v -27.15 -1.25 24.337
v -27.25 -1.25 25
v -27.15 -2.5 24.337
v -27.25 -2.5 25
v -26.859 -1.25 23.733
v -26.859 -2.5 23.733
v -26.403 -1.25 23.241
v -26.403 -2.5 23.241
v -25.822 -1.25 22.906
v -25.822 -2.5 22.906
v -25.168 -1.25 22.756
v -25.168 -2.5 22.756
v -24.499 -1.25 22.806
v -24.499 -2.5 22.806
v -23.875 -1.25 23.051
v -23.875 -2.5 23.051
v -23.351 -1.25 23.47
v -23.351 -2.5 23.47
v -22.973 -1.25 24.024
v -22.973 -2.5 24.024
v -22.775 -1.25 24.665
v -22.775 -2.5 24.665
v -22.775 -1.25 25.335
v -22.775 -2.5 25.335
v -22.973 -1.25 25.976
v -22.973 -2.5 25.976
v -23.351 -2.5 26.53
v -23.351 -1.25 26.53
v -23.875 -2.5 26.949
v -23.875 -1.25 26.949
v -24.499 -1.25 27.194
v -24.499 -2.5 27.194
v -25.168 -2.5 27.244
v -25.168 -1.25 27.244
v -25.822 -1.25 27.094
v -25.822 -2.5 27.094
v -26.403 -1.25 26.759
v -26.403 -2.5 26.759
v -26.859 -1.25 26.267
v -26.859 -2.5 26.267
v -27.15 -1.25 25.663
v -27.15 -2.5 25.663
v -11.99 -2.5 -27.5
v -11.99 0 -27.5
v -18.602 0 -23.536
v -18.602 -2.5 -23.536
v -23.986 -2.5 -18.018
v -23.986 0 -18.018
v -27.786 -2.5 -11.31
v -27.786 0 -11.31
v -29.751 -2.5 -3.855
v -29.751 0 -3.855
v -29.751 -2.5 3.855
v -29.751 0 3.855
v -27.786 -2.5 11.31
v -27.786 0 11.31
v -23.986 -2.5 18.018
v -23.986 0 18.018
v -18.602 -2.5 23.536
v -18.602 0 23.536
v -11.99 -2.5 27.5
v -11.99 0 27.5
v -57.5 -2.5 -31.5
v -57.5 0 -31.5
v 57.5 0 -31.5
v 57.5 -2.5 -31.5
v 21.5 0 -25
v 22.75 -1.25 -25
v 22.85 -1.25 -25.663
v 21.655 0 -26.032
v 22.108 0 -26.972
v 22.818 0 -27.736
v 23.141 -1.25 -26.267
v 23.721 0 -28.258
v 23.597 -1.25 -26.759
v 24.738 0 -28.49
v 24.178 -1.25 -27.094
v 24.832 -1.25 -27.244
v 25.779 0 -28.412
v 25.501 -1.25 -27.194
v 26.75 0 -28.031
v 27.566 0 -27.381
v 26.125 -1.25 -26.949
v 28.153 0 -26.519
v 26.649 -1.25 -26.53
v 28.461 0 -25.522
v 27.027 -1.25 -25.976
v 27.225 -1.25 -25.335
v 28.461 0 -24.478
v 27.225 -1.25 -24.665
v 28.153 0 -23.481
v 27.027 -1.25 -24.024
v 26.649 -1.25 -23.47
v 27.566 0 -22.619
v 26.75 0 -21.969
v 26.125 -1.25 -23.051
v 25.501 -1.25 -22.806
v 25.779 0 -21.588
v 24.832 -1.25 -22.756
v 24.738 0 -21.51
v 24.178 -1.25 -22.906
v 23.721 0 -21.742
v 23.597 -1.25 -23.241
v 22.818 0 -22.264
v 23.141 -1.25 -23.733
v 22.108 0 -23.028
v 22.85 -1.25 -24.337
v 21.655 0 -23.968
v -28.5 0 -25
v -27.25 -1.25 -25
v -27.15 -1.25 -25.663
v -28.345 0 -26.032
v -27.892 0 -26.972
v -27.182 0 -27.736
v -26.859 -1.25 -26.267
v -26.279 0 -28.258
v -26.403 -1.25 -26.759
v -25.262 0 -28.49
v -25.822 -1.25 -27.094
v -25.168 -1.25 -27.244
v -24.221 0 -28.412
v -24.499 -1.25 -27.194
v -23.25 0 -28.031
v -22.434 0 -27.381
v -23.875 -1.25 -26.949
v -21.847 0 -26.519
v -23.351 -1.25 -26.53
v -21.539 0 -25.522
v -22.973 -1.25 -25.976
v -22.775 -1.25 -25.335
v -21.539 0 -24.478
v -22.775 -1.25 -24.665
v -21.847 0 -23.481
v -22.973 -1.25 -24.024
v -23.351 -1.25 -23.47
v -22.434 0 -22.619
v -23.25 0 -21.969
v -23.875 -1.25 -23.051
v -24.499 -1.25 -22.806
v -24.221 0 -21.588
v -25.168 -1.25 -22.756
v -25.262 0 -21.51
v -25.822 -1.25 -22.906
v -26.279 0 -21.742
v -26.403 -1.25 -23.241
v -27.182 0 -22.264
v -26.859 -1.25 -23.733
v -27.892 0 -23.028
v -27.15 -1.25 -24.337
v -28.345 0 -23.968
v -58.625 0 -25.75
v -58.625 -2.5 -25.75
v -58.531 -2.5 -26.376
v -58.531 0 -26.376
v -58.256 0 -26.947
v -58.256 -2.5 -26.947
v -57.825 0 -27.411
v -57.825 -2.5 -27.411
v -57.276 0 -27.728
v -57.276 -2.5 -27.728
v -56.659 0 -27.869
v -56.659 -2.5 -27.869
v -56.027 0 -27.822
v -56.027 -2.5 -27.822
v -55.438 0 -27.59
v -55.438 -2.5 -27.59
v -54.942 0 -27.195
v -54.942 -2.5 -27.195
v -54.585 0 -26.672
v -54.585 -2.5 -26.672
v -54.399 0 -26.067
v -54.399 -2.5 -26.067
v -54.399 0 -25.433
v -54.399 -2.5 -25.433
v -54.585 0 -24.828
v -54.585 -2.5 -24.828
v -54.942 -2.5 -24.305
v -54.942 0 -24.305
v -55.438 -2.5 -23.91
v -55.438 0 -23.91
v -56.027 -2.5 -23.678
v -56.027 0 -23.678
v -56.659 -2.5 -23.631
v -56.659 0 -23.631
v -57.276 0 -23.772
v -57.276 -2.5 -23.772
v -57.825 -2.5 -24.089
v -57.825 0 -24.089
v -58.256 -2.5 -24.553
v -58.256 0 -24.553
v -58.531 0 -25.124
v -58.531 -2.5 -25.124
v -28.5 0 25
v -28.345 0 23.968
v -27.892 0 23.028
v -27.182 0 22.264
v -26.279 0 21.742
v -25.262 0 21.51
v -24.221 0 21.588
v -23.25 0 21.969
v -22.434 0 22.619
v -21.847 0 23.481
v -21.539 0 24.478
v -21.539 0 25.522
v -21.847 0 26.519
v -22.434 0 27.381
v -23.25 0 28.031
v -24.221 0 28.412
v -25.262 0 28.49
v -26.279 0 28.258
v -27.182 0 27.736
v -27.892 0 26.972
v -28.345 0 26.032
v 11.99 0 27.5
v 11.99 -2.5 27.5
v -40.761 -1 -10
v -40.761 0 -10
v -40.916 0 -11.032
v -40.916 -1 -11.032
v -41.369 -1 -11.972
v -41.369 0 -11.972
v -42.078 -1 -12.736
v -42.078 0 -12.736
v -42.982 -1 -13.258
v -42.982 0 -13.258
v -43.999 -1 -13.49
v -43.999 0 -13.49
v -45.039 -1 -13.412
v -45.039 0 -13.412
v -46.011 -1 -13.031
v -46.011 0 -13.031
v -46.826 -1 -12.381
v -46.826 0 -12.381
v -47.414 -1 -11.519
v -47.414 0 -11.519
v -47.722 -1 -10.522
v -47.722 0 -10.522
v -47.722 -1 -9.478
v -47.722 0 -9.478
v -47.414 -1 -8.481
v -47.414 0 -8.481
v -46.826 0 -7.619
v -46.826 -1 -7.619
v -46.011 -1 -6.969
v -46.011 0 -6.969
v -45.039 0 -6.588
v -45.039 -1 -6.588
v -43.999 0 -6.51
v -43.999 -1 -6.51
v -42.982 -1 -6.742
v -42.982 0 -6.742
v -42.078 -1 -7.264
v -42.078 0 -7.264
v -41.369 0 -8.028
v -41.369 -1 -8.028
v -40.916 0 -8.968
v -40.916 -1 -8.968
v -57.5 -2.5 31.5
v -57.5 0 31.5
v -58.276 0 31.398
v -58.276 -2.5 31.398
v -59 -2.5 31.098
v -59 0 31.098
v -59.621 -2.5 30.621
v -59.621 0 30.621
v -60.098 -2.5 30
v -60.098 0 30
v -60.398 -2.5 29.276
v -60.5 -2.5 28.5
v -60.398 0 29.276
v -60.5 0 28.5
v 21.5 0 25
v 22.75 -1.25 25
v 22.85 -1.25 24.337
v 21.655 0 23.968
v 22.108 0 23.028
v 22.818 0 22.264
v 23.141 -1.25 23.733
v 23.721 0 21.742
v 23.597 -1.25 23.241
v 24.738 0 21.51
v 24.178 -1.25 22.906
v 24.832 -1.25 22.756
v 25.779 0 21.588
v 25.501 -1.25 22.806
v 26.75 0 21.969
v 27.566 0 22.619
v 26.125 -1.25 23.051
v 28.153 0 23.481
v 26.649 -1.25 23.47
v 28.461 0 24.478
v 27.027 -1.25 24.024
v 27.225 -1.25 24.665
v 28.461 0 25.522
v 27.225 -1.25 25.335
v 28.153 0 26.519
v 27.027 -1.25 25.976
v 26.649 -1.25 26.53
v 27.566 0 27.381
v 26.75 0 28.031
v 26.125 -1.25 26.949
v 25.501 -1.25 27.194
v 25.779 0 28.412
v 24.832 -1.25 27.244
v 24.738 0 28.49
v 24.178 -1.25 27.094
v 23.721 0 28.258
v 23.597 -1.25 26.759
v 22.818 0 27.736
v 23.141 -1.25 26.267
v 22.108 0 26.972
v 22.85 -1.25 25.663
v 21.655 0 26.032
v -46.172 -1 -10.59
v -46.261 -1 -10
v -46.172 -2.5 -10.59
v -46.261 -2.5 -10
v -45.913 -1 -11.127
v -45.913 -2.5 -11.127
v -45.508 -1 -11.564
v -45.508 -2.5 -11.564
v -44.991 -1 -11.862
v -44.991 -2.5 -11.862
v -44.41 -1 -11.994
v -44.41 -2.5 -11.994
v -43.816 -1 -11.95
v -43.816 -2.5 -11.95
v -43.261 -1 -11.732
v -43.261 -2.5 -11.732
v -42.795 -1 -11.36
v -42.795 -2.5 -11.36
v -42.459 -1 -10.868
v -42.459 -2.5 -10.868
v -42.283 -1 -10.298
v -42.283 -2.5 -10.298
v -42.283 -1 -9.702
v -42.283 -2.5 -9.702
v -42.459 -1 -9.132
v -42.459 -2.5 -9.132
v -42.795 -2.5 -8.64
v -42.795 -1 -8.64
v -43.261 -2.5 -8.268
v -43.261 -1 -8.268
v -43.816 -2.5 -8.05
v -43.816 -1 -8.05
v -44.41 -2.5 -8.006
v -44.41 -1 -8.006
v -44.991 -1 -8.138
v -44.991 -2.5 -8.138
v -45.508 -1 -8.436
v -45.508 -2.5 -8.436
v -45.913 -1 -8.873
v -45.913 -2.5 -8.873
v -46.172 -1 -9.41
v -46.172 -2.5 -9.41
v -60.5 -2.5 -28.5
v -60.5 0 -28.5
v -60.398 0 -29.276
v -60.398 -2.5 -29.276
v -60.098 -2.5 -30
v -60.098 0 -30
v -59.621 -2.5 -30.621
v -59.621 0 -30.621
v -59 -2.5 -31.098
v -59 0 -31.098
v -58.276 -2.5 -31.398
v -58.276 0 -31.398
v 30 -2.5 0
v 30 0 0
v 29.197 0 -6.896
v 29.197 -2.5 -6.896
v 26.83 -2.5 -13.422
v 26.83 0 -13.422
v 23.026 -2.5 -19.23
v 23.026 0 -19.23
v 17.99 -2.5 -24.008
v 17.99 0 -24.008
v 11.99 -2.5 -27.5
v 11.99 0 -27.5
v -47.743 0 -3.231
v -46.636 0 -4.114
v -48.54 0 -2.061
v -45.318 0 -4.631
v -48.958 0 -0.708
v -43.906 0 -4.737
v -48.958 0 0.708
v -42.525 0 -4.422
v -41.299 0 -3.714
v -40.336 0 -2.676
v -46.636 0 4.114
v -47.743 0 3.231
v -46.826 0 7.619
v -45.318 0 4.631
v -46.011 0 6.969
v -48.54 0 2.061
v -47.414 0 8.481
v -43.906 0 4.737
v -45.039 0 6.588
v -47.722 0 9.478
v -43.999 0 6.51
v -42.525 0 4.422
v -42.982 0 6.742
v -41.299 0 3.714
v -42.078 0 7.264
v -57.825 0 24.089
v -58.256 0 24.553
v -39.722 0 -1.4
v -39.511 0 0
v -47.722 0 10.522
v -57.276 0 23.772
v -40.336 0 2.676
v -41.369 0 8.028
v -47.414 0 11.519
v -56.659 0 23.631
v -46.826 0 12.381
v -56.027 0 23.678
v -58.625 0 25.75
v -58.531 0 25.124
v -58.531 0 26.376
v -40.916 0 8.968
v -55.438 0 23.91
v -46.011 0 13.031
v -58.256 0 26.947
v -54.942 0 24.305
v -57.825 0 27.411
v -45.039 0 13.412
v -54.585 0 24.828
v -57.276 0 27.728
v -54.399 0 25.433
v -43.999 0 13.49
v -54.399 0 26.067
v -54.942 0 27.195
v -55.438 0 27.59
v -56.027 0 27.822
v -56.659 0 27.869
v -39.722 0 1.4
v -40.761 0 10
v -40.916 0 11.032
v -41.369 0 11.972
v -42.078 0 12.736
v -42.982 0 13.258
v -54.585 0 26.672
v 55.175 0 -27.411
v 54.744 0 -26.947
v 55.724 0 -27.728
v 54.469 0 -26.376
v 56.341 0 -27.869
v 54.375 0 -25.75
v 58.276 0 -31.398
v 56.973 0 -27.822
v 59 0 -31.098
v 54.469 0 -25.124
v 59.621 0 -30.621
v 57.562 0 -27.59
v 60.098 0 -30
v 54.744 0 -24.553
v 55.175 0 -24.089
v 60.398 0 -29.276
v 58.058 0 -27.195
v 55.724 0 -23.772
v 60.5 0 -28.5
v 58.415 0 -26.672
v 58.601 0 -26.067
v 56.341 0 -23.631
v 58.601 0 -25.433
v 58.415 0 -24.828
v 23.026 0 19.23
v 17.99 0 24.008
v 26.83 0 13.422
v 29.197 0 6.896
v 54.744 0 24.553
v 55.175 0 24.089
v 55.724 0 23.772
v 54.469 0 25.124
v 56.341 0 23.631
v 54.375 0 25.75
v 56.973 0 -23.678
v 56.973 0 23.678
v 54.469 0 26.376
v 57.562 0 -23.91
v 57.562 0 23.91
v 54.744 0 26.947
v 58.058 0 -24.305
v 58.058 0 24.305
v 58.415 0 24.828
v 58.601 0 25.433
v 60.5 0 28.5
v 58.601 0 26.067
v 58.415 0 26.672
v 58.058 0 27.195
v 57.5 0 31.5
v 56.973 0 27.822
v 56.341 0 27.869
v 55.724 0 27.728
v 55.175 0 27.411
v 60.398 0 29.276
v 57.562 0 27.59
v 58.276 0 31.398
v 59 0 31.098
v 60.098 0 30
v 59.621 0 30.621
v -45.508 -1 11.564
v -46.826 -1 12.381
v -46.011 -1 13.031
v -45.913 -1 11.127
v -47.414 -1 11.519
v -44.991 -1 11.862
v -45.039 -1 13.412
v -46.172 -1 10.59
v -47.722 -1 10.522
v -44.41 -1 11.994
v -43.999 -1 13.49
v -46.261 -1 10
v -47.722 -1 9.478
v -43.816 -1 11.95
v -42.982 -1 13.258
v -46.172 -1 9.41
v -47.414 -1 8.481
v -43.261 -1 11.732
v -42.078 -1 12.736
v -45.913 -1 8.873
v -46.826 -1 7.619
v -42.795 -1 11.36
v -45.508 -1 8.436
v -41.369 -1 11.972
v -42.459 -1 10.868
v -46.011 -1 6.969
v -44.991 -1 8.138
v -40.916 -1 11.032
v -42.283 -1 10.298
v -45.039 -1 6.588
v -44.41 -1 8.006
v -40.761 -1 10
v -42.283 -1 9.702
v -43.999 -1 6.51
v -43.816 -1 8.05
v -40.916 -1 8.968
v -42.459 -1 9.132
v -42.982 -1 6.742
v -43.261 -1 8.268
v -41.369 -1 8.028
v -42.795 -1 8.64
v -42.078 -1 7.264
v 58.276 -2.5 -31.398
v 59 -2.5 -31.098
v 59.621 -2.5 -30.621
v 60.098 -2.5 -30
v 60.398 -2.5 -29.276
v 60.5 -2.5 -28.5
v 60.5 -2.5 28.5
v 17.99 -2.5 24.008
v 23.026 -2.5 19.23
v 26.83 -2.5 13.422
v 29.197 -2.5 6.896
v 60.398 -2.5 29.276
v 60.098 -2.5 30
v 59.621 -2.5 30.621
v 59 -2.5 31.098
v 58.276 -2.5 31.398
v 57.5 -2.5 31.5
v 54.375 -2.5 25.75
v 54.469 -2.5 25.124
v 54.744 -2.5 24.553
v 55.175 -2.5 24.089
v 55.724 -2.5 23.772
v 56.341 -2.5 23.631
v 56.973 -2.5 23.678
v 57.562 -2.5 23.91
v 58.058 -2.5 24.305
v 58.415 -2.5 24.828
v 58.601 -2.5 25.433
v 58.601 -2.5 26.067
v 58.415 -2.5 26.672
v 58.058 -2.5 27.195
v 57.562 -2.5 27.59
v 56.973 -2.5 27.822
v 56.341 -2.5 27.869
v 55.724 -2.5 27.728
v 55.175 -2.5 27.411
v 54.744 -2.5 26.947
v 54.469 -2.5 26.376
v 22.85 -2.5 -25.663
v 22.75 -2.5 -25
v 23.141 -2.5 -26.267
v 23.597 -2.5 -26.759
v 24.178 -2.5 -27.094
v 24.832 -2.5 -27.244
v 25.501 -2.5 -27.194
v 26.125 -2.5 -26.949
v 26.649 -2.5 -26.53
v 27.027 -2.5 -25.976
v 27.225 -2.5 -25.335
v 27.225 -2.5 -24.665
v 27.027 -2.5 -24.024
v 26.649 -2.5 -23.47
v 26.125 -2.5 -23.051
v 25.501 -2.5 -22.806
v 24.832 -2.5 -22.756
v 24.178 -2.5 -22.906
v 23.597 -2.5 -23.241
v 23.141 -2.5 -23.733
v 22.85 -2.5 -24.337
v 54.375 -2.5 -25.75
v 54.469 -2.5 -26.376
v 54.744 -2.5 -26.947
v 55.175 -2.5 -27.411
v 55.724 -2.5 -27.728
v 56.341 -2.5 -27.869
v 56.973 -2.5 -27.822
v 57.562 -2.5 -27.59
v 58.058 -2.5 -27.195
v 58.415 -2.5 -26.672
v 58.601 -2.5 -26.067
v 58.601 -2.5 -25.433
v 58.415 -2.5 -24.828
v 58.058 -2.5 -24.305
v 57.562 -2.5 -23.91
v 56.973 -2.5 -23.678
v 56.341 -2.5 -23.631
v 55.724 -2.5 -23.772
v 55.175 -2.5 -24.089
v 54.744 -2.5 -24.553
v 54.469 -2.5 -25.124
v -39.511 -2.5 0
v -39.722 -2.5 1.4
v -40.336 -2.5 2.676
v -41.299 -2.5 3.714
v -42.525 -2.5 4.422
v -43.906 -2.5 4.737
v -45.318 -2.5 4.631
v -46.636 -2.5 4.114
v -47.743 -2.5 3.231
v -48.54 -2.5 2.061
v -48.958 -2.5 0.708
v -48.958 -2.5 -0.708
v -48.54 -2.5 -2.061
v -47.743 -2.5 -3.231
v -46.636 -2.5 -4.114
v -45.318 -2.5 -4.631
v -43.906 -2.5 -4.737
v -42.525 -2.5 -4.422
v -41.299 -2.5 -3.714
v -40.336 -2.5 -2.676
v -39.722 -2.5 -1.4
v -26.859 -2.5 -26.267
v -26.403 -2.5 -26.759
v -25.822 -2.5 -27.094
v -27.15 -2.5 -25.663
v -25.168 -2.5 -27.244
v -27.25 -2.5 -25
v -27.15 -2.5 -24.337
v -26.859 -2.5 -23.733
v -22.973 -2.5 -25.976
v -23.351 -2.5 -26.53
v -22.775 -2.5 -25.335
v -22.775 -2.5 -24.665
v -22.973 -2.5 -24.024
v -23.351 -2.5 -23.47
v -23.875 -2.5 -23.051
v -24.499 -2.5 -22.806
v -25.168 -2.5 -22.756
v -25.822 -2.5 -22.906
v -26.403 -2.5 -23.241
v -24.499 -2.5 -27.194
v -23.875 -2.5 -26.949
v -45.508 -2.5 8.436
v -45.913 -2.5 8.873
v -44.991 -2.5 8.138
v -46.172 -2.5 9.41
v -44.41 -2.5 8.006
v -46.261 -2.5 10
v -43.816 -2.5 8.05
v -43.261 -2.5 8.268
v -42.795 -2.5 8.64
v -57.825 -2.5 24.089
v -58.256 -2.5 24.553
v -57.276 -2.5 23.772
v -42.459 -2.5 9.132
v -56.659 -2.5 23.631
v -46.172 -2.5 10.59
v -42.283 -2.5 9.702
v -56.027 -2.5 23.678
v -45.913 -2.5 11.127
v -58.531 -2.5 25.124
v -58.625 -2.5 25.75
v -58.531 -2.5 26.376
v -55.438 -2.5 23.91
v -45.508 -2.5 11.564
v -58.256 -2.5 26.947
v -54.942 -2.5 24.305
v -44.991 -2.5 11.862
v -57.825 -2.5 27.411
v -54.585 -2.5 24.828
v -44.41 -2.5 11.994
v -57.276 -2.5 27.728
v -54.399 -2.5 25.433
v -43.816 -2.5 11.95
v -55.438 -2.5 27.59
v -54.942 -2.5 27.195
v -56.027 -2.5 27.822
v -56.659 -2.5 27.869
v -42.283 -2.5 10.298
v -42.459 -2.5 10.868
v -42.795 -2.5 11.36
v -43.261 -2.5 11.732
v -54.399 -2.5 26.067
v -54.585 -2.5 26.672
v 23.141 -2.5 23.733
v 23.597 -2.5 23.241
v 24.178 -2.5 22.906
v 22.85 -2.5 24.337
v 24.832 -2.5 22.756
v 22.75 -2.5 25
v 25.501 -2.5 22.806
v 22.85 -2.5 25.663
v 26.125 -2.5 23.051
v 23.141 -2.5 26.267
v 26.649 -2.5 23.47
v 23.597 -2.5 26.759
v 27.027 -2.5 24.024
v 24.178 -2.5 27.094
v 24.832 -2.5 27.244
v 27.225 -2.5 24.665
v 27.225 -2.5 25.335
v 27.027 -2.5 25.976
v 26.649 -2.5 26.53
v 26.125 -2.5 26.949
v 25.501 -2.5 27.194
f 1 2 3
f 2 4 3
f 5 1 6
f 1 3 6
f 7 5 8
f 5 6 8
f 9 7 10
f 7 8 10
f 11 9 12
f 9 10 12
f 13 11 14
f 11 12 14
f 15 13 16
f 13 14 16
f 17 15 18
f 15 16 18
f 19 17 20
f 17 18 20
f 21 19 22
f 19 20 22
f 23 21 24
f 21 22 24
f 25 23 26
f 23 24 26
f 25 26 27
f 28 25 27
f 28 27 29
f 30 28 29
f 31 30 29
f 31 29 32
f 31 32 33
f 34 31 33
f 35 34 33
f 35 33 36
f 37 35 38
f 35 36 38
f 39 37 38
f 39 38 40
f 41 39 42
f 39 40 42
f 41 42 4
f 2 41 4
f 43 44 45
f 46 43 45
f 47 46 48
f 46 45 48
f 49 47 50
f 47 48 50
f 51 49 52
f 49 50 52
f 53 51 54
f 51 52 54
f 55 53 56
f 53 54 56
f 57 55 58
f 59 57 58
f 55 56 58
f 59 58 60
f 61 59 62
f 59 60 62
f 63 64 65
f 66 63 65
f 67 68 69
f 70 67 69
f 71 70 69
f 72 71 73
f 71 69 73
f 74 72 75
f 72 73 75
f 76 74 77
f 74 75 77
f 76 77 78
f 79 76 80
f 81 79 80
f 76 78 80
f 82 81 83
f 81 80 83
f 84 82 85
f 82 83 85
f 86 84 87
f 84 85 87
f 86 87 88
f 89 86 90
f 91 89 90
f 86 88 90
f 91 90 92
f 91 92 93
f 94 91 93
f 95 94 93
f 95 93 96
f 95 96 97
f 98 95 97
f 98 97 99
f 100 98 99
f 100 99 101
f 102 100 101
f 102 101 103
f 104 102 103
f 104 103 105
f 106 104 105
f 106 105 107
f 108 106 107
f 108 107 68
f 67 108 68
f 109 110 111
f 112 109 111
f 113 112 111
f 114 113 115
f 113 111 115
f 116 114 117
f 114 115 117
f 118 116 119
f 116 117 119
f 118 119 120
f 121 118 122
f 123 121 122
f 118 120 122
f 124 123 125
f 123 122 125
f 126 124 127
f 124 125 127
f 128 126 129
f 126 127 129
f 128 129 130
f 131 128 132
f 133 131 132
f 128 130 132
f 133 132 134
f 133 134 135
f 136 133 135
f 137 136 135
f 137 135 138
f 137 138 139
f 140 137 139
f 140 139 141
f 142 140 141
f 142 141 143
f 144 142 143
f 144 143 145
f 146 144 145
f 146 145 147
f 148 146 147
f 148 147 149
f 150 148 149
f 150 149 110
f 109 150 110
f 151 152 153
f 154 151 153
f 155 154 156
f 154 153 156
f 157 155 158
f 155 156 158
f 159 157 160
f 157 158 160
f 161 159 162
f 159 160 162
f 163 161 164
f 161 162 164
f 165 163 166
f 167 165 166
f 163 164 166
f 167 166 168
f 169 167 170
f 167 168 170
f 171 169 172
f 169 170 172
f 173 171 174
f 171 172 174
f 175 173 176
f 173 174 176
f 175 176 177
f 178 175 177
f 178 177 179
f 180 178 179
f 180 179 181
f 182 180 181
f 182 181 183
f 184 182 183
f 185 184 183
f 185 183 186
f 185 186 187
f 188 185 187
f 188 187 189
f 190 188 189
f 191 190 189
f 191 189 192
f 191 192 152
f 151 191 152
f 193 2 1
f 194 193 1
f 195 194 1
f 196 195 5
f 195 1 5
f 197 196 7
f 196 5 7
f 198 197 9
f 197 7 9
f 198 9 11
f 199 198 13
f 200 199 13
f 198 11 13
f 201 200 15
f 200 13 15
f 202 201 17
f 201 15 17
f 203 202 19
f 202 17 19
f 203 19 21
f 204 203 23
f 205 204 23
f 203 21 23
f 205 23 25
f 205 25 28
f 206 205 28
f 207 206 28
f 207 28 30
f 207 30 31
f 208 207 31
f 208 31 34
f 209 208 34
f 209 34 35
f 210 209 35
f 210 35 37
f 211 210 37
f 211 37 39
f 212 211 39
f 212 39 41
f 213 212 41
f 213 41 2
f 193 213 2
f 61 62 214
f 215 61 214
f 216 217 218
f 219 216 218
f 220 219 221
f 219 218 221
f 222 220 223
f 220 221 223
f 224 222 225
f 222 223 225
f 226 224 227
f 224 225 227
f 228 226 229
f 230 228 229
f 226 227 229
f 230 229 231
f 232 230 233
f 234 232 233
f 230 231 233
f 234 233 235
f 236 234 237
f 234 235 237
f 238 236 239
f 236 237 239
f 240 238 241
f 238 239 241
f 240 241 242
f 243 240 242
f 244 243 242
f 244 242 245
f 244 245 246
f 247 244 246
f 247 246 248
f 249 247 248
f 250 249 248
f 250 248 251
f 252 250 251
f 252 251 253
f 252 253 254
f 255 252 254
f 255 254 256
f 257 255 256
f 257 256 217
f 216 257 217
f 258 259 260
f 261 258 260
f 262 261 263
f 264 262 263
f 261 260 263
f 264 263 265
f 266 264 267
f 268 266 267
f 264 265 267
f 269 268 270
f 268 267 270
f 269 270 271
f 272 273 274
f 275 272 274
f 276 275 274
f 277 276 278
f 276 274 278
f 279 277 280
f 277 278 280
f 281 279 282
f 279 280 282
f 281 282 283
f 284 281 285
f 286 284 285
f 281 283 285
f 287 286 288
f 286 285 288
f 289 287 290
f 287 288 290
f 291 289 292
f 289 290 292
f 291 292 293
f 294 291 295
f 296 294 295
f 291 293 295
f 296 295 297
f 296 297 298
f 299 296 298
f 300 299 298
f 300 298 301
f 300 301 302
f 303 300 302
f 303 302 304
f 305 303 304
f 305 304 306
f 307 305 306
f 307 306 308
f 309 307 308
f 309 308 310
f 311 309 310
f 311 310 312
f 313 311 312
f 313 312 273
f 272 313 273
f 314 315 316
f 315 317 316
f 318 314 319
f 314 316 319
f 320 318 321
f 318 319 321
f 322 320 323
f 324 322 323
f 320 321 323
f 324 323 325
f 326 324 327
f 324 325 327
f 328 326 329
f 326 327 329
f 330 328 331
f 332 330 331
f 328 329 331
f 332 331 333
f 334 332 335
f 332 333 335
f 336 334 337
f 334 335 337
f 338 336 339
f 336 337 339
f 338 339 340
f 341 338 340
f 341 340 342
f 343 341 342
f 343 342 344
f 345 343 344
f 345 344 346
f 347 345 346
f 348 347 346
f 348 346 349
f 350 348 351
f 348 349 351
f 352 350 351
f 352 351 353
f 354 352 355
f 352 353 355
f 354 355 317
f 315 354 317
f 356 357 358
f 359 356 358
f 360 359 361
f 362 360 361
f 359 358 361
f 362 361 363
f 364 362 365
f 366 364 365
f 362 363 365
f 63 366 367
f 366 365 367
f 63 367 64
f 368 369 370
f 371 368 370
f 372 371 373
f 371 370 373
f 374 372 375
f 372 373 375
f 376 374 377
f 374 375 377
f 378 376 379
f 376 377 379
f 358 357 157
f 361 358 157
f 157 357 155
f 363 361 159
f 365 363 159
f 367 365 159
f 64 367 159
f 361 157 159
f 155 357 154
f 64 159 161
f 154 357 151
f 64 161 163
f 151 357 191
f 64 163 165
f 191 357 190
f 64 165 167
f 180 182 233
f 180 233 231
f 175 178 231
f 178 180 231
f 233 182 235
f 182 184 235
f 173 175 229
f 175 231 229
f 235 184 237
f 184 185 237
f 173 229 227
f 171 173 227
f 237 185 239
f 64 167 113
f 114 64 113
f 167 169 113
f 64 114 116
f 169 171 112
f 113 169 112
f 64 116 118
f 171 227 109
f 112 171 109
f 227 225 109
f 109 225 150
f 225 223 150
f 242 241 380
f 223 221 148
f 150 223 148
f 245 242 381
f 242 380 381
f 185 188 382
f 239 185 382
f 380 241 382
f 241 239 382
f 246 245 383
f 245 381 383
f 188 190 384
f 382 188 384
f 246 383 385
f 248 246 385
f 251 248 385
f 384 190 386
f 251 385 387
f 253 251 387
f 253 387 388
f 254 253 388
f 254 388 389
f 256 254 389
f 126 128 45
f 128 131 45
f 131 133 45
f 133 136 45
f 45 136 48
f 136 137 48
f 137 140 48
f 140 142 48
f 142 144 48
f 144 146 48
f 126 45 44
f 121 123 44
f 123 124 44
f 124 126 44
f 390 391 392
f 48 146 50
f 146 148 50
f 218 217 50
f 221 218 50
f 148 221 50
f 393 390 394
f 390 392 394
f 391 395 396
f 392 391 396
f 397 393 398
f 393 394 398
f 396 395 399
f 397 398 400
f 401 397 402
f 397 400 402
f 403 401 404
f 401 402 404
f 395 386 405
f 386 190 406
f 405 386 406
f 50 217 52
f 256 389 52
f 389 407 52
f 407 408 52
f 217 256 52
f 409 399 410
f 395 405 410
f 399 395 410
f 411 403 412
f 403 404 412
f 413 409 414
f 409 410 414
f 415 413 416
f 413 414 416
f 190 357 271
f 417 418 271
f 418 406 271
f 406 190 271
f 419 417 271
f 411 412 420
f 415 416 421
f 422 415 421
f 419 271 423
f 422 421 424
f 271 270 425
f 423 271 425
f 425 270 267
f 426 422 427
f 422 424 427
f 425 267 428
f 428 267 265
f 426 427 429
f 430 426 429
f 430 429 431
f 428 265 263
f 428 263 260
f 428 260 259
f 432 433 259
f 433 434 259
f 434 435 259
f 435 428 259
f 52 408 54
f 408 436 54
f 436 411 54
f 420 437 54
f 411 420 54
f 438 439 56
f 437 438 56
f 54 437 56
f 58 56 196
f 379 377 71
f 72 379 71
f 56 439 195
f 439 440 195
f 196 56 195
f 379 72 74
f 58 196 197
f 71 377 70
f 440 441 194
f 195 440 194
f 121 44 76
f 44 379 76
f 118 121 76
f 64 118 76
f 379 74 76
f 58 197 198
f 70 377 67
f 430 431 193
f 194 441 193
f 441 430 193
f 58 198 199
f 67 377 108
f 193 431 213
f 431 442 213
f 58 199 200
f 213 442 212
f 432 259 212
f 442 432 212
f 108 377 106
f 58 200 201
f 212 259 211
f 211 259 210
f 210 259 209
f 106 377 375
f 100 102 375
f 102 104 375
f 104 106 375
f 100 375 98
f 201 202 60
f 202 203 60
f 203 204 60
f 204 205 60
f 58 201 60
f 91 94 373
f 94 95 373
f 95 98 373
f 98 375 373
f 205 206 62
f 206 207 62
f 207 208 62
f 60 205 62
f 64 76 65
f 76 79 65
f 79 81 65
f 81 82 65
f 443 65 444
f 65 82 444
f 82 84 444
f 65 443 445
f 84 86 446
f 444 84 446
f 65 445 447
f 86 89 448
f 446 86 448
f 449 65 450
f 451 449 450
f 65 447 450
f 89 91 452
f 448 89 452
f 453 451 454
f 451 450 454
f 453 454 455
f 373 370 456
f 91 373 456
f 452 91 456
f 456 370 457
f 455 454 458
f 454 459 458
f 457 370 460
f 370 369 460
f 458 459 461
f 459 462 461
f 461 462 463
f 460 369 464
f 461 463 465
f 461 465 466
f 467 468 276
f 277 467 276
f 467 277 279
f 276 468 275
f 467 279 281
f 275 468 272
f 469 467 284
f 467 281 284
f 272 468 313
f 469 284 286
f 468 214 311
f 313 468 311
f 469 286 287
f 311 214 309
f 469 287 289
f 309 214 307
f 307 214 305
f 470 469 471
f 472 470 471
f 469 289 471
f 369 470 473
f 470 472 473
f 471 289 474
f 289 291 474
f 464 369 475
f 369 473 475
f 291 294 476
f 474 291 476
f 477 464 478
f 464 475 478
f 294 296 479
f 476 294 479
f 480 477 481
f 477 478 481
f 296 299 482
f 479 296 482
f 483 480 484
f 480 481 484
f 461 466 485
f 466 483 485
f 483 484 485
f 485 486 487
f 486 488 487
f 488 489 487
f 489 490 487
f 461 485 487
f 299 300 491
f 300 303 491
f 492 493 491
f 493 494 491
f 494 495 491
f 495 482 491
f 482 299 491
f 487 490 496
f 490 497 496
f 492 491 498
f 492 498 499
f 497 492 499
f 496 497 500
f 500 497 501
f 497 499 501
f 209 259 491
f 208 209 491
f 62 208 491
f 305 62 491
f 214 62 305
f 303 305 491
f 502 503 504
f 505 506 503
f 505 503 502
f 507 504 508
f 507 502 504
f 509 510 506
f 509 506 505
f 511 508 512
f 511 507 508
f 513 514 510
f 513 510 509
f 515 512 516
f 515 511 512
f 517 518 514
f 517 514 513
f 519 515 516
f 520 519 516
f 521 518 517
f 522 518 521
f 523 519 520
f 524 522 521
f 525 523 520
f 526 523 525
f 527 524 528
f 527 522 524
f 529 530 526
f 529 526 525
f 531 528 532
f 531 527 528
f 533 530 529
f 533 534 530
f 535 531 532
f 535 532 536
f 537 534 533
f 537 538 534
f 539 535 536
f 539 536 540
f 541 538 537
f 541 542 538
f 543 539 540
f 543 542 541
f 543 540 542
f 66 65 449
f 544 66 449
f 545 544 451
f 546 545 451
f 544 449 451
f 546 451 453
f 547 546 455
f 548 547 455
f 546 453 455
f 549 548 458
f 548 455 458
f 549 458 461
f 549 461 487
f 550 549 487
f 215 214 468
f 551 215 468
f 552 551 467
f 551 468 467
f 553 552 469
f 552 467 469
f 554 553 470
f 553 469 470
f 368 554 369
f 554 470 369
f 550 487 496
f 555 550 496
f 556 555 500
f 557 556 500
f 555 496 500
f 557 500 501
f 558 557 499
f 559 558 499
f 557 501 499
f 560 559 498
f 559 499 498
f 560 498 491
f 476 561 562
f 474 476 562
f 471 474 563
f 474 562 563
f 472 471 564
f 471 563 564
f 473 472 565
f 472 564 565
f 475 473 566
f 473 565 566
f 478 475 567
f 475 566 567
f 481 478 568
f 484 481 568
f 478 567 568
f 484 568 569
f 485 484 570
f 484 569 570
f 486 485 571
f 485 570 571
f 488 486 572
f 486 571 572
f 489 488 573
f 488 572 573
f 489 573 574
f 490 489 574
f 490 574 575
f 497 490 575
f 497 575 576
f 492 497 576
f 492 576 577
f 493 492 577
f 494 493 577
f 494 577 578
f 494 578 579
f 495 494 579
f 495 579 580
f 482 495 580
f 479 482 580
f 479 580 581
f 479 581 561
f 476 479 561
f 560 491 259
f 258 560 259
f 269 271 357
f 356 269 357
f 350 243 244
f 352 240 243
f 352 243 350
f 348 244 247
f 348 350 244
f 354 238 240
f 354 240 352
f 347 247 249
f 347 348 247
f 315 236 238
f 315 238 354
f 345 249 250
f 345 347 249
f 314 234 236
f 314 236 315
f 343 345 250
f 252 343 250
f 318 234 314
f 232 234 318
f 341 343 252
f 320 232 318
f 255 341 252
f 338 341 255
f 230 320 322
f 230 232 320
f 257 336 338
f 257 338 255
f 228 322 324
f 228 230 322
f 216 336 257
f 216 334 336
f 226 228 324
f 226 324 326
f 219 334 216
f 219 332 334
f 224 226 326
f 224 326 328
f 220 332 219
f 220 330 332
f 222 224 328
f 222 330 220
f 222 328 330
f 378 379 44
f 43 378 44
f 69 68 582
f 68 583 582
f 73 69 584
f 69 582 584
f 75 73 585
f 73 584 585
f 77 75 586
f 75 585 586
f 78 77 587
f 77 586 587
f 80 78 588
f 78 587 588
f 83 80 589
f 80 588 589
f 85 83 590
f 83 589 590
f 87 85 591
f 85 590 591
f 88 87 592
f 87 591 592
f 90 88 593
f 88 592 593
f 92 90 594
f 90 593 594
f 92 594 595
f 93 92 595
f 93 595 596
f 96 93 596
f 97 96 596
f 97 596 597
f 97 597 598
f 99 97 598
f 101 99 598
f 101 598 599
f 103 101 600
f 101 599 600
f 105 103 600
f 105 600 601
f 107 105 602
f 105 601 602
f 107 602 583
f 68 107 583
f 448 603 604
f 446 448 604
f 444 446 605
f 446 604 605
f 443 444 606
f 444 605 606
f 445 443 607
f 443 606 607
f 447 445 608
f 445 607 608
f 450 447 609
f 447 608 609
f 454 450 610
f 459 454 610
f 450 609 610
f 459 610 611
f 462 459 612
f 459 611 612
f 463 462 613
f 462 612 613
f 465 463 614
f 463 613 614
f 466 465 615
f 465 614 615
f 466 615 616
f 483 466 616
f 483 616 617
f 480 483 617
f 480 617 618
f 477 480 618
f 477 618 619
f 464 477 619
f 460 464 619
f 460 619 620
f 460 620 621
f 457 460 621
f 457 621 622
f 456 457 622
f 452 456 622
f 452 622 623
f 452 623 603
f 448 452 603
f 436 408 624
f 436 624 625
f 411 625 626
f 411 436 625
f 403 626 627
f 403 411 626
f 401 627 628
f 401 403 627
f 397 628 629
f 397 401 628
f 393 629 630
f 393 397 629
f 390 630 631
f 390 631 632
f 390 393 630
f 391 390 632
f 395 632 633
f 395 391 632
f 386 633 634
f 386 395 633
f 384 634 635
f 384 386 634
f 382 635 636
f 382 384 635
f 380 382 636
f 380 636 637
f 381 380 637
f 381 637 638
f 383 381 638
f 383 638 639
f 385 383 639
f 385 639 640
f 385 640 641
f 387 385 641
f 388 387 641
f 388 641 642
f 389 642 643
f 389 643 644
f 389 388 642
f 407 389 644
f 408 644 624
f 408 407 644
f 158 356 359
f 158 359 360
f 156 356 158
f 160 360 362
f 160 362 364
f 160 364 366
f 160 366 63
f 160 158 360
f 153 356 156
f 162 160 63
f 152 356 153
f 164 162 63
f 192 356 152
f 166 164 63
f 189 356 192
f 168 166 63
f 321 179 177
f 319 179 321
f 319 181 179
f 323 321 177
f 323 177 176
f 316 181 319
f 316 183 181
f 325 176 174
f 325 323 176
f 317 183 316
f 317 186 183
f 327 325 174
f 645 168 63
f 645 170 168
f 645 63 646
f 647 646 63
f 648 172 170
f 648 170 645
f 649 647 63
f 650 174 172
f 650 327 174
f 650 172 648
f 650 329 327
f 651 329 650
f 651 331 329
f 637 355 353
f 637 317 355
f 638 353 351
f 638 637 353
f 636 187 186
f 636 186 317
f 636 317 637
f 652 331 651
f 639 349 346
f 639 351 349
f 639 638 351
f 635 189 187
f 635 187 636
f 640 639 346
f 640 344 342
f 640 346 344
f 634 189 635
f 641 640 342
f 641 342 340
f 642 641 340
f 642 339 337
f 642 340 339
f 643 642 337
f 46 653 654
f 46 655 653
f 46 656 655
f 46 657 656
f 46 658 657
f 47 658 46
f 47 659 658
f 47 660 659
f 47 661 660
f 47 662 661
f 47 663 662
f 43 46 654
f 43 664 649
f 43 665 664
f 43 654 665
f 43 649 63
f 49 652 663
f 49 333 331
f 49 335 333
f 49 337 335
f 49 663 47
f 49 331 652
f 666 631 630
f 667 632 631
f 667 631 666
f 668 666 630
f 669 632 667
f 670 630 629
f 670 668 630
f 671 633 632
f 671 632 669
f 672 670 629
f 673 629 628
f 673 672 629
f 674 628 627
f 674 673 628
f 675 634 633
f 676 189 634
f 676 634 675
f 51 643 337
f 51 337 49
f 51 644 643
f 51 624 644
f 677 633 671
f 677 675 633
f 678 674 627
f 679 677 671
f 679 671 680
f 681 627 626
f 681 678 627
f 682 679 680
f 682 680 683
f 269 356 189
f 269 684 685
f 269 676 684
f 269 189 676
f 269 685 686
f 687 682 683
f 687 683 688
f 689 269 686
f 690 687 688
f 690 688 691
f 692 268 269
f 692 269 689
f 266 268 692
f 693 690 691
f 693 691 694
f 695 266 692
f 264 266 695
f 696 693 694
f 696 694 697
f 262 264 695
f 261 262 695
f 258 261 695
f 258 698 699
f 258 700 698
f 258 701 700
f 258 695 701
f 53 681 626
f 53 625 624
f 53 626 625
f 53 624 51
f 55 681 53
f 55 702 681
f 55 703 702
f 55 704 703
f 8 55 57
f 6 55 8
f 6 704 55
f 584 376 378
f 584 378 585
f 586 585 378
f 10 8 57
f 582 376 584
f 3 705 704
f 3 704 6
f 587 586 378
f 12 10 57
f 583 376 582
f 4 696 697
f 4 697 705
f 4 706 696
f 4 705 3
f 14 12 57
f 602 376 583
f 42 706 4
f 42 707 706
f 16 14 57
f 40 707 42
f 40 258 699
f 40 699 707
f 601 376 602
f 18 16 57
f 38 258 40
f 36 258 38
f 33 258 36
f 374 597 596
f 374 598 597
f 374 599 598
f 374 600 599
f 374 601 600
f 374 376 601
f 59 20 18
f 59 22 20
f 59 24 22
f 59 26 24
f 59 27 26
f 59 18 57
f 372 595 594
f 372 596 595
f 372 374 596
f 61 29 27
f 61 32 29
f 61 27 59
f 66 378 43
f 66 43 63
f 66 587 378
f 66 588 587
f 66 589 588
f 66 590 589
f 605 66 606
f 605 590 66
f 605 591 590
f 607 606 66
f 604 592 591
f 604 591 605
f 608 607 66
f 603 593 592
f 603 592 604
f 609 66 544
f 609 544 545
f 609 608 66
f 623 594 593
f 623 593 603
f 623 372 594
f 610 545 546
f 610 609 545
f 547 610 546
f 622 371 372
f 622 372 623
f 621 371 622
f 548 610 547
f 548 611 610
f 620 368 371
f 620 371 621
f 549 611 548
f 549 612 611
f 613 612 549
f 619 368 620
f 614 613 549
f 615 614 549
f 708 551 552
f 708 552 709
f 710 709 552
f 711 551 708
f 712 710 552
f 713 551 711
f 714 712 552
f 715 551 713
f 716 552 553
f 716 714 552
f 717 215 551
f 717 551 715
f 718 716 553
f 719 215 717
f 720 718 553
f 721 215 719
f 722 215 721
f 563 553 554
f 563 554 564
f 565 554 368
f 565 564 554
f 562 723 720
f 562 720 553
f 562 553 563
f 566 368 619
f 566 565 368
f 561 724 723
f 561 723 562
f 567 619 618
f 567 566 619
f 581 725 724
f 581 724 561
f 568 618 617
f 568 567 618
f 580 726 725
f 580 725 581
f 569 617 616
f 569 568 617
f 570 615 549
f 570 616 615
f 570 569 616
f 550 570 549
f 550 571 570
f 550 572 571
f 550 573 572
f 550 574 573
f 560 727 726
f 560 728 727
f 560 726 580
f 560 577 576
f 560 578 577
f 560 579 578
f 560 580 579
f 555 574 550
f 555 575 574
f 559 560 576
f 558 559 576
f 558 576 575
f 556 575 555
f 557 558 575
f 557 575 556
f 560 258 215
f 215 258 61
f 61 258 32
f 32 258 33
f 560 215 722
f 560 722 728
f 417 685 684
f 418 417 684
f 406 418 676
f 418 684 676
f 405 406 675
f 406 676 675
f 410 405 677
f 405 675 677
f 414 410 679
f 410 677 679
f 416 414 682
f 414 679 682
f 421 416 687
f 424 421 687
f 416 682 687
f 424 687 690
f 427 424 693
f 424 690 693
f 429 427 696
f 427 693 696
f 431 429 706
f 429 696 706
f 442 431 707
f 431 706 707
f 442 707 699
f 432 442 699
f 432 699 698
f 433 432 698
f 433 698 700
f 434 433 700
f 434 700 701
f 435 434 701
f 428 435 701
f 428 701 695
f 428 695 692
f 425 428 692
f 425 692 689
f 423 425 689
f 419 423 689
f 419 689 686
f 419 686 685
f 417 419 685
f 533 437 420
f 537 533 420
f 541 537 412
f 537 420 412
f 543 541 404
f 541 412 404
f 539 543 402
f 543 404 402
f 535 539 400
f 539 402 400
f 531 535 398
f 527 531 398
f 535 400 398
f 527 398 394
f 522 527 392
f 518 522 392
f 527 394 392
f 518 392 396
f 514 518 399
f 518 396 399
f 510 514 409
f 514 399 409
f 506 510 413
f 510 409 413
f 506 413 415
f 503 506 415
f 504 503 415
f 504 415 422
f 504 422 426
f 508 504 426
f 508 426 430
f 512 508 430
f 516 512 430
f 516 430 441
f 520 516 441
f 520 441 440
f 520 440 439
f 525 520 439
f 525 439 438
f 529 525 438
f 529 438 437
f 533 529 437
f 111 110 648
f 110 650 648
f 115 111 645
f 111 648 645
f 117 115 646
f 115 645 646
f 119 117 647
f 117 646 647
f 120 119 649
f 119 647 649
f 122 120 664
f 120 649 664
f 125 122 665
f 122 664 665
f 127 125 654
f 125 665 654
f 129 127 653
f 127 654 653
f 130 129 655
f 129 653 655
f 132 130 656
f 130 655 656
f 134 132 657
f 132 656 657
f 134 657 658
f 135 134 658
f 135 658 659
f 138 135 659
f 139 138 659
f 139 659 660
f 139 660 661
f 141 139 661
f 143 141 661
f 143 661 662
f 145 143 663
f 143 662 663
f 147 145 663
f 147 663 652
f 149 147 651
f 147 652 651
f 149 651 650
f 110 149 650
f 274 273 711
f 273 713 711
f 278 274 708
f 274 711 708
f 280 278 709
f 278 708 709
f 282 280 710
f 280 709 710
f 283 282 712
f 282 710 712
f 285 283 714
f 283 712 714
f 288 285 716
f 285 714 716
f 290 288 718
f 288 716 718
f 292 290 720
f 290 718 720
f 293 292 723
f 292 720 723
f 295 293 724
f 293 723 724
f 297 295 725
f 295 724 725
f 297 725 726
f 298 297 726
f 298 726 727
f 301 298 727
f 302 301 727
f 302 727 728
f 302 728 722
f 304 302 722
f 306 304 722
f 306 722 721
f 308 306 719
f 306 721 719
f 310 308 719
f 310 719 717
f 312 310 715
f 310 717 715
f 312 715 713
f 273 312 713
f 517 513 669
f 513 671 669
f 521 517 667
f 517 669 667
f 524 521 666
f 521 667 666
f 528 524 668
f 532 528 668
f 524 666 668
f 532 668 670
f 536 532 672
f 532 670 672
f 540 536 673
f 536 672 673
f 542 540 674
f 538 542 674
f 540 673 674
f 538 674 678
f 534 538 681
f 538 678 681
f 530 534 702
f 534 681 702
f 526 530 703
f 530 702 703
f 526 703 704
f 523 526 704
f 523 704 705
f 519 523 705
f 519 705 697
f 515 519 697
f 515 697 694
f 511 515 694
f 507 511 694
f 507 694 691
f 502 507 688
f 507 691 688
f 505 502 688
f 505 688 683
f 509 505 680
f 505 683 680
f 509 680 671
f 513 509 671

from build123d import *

# Parameters (mm, degrees)
F0_R           = 4.75
F1_DEPTH       = 2.5
F2_D           = 4.25
F3_D           = 4.5
F3_CSINK_D     = 7
F3_CSINK_ANGLE = 90
F4_D           = 4
F4_CBORE_D     = 7
F4_CBORE_DEPTH = 1


with BuildPart() as f1:
    # F0 (on Front) → F1 (new body)
    with BuildSketch(Plane.XZ):
        with BuildLine():
            ThreePointArc((60.5, 28.5), (59.62132, 30.62132), (57.5, 31.5))
            Line((57.5, 31.5), (-57.5, 31.5))
            ThreePointArc((-57.5, 31.5), (-59.62132, 30.62132), (-60.5, 28.5))
            Line((-60.5, 28.5), (-60.5, -28.5))
            ThreePointArc((-60.5, -28.5), (-59.62132, -30.62132), (-57.5, -31.5))
            Line((-57.5, -31.5), (57.5, -31.5))
            ThreePointArc((57.5, -31.5), (59.62132, -30.62132), (60.5, -28.5))
            Line((60.5, -28.5), (60.5, 28.5))
        make_face()
        with Locations((-44.260606, 0)):
            Circle(F0_R, mode=Mode.SUBTRACT)
        with BuildLine():
            ThreePointArc((11.989579, 27.5), (25.096687, 16.436433), (30, 0))
            ThreePointArc((30, 0), (25.096687, -16.436433), (11.989579, -27.5))
            ThreePointArc((11.989579, -27.5), (0, -30), (-11.989579, -27.5))
            ThreePointArc((-11.989579, -27.5), (-30, 0), (-11.989579, 27.5))
            ThreePointArc((-11.989579, 27.5), (0, 30), (11.989579, 27.5))
        make_face(mode=Mode.SUBTRACT)
        with BuildLine():
            Line((-11.989579, 27.5), (11.989579, 27.5))
            ThreePointArc((11.989579, 27.5), (0, 30), (-11.989579, 27.5))
        make_face()
        with BuildLine():
            ThreePointArc((-11.989579, -27.5), (0, -30), (11.989579, -27.5))
            Line((11.989579, -27.5), (-11.989579, -27.5))
        make_face()
    extrude(amount=F1_DEPTH)

    # F2 (through all)
    with Locations(Plane(origin=(0, 0, 0), x_dir=(1, 0, 0), z_dir=(0, 1, 0))):
        with Locations((-56.5, 25.75), (56.5, 25.75), (56.5, -25.75), (-56.5, -25.75)):
            Hole(F2_D / 2)

    # F3 (through all)
    with Locations(Plane(origin=(0, 0, 0), x_dir=(1, 0, 0), z_dir=(0, 1, 0))):
        with Locations((-25, 25), (25, 25), (25, -25), (-25, -25)):
            CounterSinkHole(F3_D / 2, F3_CSINK_D / 2, counter_sink_angle=F3_CSINK_ANGLE)

    # F4 (through all)
    with Locations(Plane(origin=(0, 0, 0), x_dir=(1, 0, 0), z_dir=(0, 1, 0))):
        with Locations((-44.260606, 10), (-44.260606, -10)):
            CounterBoreHole(F4_D / 2, F4_CBORE_D / 2, F4_CBORE_DEPTH)


solid = f1.part
